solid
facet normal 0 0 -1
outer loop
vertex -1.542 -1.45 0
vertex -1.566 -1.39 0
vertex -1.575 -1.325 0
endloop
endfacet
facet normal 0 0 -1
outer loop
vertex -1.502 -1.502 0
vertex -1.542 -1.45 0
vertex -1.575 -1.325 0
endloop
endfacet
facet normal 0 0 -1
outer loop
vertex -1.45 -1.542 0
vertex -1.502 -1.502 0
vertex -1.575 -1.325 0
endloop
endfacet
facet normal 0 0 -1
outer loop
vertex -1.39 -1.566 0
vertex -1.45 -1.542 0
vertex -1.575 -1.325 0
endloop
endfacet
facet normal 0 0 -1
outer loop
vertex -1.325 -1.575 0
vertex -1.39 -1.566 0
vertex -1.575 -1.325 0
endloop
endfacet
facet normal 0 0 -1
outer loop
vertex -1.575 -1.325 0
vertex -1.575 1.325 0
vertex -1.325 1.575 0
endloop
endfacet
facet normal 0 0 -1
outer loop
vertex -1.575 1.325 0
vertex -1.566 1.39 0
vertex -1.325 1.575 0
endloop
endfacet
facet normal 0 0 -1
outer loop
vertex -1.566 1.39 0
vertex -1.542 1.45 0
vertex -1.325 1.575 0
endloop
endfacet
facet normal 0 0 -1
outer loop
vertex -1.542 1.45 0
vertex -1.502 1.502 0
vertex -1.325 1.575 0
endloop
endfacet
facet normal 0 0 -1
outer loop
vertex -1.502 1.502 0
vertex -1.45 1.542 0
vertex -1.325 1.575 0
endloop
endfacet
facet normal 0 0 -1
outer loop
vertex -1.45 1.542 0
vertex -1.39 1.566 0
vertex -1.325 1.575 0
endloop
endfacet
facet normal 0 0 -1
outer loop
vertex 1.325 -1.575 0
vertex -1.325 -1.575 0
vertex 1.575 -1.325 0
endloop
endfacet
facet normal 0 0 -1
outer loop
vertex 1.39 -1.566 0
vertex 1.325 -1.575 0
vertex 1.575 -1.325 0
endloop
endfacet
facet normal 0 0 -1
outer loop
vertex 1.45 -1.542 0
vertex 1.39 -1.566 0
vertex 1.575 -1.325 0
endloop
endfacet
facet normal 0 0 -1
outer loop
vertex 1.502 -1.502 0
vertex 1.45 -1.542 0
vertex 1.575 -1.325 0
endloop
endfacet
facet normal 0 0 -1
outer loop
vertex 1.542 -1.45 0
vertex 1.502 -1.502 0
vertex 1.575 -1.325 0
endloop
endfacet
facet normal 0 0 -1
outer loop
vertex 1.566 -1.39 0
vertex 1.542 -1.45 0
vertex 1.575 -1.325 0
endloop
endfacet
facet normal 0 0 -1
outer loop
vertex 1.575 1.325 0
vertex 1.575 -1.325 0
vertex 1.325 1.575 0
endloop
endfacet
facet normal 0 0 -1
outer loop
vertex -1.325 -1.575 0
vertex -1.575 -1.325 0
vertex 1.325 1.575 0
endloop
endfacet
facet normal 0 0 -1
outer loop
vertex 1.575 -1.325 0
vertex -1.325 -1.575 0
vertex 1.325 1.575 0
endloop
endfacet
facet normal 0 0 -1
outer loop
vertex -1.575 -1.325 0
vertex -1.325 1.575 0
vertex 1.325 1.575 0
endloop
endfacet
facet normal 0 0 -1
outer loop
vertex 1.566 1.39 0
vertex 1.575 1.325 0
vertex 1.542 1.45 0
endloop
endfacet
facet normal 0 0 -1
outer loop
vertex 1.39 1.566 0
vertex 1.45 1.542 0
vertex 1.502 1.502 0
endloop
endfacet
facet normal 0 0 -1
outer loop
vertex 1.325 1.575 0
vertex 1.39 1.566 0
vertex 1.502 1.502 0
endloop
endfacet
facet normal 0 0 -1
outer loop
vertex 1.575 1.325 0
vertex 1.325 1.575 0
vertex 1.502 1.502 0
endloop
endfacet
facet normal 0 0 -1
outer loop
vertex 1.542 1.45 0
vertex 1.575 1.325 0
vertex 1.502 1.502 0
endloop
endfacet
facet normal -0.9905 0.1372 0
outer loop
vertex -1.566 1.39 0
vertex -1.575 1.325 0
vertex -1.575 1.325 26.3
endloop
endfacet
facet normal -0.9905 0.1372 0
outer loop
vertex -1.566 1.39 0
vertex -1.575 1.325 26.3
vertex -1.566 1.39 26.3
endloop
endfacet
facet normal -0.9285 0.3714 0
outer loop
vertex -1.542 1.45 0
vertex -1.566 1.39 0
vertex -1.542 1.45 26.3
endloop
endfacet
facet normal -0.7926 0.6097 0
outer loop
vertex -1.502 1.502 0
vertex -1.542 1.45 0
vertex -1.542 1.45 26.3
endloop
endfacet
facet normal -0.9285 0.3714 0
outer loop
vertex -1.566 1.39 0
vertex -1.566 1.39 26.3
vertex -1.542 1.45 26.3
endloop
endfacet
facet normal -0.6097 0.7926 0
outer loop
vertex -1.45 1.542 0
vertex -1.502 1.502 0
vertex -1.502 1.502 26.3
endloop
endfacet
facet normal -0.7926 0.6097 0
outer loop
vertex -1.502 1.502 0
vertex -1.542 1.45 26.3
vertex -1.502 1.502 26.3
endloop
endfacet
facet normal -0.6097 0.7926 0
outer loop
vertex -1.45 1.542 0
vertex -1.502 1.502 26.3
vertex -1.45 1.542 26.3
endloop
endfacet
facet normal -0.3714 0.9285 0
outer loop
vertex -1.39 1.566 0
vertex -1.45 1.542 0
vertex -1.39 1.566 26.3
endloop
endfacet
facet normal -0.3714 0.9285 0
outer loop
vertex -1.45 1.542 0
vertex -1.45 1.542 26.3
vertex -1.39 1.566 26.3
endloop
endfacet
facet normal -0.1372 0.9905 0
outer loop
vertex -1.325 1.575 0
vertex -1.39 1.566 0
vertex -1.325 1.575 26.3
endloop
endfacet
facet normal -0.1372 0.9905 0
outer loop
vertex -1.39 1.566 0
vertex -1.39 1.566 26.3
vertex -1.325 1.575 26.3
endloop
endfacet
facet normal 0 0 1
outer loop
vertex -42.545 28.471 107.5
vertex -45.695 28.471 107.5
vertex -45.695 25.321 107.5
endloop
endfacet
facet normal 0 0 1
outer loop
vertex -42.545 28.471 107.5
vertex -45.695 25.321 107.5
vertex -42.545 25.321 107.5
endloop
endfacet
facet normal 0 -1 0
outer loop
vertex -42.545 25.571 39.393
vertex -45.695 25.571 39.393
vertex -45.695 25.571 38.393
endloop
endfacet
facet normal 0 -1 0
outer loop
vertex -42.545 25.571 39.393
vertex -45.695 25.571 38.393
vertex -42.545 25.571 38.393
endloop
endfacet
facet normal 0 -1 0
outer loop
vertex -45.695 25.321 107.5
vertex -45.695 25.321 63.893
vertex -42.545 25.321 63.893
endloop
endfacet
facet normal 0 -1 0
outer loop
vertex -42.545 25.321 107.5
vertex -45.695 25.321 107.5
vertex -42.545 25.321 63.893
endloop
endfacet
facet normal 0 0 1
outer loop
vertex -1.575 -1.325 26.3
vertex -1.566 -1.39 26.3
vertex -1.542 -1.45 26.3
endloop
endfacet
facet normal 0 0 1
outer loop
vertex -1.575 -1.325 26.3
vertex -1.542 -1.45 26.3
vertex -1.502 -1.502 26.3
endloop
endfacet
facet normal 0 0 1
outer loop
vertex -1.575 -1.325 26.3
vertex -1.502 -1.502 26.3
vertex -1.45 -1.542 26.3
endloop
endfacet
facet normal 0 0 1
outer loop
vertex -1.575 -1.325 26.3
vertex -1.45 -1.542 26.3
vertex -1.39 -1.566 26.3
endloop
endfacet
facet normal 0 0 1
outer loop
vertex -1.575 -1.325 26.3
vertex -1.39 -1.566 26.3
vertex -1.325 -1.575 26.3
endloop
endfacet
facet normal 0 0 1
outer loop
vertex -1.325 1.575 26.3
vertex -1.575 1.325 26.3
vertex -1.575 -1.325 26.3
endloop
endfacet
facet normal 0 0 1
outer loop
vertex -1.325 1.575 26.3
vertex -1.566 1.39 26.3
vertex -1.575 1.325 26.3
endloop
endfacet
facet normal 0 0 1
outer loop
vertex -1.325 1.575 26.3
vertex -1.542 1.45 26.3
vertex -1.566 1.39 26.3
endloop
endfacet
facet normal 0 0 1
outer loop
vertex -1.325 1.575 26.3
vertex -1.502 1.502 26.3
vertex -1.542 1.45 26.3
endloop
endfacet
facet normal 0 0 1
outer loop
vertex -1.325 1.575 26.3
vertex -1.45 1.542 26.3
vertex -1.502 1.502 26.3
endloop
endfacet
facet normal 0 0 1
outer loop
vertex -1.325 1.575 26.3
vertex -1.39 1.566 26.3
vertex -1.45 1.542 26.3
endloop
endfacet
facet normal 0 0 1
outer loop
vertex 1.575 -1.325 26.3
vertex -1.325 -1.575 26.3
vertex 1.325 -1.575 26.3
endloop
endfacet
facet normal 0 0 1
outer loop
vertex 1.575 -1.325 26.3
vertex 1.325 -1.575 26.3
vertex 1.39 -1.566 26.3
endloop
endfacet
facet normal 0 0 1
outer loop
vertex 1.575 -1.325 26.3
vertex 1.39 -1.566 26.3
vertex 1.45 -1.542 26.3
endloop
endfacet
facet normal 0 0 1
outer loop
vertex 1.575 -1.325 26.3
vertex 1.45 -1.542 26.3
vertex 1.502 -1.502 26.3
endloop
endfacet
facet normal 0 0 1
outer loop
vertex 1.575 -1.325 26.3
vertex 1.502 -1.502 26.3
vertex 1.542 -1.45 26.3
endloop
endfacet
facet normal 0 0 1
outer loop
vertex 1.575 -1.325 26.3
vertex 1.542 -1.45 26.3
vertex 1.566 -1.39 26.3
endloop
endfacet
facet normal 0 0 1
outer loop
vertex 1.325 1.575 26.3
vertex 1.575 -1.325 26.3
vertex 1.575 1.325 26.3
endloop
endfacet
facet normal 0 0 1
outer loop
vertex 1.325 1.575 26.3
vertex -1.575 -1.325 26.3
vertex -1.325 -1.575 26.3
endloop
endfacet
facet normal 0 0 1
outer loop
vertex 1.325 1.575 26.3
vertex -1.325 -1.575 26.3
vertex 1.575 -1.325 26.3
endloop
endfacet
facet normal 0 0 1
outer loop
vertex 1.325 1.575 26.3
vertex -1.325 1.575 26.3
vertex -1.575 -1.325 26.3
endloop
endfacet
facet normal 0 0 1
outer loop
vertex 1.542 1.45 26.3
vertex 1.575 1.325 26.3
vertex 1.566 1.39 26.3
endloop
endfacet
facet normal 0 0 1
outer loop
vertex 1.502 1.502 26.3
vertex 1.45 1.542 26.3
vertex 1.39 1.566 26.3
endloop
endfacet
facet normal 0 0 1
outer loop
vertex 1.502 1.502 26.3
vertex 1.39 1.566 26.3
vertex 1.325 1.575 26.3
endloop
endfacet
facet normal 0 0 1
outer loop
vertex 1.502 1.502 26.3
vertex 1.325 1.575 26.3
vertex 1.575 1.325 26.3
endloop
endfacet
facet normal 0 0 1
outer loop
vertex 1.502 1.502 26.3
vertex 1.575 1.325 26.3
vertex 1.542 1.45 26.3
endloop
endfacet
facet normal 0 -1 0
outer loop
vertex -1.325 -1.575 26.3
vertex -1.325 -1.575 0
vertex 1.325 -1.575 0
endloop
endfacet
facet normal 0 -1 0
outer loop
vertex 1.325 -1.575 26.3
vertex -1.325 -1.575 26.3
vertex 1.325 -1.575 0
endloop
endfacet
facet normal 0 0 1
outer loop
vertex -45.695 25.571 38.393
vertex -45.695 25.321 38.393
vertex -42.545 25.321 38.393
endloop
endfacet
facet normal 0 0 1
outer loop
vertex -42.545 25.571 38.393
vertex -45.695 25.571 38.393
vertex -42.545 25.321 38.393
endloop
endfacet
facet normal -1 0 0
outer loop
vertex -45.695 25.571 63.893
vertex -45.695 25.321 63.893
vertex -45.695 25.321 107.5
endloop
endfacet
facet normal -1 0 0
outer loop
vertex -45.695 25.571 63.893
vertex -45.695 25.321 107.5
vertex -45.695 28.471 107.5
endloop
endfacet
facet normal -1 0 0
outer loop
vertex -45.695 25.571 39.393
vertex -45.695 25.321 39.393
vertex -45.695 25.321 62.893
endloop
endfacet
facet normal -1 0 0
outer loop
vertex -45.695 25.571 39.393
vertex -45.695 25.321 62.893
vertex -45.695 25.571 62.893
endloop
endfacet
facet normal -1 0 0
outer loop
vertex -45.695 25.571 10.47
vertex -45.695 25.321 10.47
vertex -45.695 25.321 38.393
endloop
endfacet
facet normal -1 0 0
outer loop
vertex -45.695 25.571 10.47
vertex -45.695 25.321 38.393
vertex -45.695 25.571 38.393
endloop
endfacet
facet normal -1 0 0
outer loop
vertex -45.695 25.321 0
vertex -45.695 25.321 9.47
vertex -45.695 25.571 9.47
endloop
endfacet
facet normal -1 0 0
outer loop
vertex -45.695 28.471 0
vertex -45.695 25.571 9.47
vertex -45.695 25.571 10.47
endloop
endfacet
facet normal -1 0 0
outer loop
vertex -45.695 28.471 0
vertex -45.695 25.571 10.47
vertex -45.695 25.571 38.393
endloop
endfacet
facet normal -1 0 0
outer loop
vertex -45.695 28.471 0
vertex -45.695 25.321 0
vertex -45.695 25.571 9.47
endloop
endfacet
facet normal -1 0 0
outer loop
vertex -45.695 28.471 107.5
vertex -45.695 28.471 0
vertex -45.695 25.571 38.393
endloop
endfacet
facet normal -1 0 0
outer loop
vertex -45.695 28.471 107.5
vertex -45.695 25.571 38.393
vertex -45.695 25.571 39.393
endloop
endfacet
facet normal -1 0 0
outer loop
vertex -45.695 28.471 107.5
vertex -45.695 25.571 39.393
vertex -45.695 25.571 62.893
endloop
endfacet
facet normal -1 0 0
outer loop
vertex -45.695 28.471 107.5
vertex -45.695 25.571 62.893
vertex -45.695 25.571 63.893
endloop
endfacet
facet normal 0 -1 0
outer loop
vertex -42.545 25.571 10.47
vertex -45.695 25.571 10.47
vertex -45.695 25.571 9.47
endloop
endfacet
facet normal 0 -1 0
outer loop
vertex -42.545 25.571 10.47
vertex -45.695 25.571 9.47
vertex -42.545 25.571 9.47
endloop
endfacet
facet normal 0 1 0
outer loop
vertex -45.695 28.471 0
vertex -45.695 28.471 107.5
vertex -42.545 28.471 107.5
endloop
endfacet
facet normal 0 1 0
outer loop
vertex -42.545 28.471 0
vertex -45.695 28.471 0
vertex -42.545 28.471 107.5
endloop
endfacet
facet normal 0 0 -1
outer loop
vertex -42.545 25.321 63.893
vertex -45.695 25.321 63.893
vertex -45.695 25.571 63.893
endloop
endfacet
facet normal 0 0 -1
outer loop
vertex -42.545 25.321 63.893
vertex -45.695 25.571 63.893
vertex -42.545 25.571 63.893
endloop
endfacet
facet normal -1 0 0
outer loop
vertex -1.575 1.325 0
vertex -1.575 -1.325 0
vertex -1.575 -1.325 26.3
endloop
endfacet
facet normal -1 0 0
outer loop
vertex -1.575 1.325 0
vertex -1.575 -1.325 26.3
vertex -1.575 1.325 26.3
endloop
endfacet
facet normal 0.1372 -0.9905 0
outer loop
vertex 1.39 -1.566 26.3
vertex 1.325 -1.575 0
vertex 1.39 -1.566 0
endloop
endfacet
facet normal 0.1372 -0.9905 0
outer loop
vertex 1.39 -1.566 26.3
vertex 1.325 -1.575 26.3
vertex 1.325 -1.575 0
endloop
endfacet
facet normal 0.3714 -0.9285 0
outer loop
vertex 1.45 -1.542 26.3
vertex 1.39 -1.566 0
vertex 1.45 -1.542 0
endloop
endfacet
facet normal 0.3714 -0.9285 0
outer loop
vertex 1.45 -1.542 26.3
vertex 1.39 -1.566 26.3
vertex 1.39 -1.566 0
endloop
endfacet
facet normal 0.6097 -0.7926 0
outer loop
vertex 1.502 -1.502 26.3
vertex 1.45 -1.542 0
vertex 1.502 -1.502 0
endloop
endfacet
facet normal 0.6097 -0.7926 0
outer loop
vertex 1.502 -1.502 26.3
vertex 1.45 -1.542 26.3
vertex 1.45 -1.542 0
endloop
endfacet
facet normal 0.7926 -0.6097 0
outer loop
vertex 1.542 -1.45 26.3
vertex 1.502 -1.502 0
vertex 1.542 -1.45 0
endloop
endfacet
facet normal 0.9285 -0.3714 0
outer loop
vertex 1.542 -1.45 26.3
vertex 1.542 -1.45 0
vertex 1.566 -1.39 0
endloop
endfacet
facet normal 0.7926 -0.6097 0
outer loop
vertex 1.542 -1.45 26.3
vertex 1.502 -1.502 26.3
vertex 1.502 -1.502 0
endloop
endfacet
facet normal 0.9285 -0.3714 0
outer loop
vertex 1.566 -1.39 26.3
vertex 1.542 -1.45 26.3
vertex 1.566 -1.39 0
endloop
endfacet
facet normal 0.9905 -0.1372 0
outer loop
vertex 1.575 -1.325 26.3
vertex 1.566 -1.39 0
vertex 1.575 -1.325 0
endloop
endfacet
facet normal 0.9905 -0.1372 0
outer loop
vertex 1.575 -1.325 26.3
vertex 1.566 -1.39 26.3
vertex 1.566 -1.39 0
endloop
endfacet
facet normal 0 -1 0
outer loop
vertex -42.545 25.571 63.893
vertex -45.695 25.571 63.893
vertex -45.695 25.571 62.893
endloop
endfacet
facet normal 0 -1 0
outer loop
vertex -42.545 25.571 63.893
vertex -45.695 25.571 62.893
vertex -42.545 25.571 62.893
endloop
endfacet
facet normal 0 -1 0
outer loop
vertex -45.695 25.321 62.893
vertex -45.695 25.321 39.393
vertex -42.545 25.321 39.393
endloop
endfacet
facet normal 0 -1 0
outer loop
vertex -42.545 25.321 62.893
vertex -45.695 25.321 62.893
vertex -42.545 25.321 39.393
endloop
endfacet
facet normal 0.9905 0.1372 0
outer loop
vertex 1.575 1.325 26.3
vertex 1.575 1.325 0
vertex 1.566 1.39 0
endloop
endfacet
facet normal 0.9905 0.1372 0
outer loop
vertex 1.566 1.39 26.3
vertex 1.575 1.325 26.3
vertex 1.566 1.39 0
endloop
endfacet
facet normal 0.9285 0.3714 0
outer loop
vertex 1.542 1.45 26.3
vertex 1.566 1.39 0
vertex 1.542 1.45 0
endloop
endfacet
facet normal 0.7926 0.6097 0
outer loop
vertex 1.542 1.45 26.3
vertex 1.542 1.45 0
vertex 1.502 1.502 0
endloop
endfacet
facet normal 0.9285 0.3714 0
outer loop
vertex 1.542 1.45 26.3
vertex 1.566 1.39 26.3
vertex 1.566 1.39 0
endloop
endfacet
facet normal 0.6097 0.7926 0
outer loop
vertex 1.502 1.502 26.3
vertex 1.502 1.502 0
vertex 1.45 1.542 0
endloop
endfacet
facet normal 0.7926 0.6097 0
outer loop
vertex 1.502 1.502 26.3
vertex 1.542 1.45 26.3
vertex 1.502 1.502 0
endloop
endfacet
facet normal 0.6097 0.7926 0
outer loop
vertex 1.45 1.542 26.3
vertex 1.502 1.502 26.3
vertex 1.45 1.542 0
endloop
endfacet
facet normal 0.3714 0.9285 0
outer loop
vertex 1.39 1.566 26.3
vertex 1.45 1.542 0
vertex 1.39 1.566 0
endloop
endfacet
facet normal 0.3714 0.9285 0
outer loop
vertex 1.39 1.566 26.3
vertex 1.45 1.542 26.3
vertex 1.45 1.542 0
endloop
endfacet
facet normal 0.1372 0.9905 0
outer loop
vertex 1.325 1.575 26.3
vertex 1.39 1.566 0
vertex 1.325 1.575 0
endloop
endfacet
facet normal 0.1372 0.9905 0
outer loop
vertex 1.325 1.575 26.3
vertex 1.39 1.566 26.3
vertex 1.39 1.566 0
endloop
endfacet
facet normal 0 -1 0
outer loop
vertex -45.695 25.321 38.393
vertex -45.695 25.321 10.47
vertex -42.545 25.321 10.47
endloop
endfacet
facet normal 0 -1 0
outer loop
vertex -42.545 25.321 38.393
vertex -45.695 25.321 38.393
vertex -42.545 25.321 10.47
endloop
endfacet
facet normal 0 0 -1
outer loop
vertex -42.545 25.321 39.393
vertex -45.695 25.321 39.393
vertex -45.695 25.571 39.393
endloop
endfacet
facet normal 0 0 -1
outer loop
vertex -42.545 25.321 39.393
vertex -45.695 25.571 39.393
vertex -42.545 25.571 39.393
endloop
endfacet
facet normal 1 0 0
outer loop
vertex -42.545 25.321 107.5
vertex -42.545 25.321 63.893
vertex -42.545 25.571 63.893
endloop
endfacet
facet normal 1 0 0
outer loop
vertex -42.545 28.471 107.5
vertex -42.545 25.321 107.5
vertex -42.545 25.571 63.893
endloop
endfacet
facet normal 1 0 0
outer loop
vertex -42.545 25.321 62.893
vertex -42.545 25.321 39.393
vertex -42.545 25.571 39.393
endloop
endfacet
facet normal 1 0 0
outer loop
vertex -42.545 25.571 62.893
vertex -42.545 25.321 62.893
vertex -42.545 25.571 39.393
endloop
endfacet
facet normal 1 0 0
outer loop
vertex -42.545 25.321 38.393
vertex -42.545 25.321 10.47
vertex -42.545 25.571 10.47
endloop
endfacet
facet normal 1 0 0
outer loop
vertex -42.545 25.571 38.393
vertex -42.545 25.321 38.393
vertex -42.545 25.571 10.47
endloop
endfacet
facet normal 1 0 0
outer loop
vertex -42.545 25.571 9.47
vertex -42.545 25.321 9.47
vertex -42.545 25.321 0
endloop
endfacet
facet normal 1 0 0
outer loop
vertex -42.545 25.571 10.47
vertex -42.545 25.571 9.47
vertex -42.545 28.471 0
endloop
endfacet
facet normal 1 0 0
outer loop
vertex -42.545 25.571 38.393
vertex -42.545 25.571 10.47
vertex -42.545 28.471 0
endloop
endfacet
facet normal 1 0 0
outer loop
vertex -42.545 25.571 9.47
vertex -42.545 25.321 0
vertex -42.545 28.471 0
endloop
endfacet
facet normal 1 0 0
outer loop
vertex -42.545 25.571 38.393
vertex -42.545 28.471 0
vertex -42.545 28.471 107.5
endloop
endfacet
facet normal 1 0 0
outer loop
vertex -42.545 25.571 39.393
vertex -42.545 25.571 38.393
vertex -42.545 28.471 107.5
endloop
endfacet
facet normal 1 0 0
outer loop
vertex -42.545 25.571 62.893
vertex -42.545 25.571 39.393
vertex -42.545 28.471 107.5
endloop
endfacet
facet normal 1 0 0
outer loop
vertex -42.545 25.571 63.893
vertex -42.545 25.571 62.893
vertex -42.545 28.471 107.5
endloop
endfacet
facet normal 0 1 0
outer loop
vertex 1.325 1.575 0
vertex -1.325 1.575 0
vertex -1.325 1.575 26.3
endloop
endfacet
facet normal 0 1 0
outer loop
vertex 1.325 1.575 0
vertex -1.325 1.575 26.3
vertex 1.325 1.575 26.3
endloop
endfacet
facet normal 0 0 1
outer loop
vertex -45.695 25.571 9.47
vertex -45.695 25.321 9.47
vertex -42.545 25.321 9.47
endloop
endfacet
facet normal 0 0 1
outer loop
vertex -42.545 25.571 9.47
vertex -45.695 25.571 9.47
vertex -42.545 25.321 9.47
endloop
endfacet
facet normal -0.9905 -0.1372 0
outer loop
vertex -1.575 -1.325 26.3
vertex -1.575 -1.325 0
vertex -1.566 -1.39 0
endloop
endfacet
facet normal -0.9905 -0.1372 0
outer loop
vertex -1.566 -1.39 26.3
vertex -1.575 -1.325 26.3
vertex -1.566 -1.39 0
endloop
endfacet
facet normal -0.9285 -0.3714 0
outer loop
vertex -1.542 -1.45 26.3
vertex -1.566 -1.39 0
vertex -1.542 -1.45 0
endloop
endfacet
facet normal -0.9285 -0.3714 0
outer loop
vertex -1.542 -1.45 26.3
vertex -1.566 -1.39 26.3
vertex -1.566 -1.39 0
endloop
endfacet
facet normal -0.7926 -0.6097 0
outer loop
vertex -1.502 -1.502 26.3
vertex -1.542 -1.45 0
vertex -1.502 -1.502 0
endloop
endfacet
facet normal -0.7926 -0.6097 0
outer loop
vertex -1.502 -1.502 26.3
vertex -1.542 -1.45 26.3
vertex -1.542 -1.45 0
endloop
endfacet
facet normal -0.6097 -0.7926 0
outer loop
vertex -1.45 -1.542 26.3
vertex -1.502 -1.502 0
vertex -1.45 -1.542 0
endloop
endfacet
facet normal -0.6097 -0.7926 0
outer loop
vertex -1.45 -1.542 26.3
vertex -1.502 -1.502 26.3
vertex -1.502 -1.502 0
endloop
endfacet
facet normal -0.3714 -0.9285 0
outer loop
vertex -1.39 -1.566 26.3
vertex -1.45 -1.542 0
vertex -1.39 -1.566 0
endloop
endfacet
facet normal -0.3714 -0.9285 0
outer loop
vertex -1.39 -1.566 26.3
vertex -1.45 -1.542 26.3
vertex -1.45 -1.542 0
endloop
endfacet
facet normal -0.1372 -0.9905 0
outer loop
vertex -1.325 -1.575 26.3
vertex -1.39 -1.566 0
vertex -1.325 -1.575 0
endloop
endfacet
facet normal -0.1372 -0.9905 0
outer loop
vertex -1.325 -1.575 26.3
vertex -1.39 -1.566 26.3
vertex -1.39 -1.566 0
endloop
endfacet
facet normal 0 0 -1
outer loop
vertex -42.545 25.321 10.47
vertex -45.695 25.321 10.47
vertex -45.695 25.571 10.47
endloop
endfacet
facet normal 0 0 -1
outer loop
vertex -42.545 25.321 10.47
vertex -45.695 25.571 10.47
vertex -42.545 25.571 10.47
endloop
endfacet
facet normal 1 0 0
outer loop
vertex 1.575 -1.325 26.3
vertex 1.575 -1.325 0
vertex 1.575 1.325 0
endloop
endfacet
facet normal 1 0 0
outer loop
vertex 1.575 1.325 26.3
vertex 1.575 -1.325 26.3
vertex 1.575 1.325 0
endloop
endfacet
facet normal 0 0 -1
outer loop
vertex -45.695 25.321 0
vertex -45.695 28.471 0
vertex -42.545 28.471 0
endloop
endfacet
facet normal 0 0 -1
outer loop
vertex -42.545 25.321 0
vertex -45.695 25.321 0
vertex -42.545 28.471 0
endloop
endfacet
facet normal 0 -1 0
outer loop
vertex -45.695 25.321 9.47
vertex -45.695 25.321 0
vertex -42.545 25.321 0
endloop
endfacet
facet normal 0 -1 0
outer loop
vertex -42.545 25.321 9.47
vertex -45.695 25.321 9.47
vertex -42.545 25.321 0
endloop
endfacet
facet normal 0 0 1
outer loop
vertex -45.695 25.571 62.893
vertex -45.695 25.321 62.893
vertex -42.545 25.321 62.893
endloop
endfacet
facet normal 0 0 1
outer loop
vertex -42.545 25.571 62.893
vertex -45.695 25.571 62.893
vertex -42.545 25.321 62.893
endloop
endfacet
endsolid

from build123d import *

# Parameters (mm, degrees)
F0_W     = 3.15
F0_H     = 3.15
F1_DEPTH = 26.3
F2_R     = 0.25
F3_DEPTH = 107.5
F4_W     = 3.15
F4_H     = 1
F5_DEPTH = 0.25


with BuildPart() as f1:
    # F0 (on Top) → F1 (new body)
    with BuildSketch(Plane.XY):
        Rectangle(F0_W, F0_H)
    extrude(amount=F1_DEPTH)

    # F2
    f2_edges = [f1.edges().sort_by_distance(p)[0] for p in [
        (-1.575, -1.575, 13.15),
        (1.575, -1.575, 13.15),
        (1.575, 1.575, 13.15),
        (-1.575, 1.575, 13.15),
    ]]
    fillet(f2_edges, radius=F2_R)


with BuildPart() as f3:
    # F0 (on Top) → F3 (new body)
    with BuildSketch(Plane.XY):
        with Locations((-44.120011, 26.895686)):
            Rectangle(F0_W, F0_H)
    extrude(amount=F3_DEPTH)

    # F4 (on face) → F5 (cut)
    with BuildSketch(Plane.XZ.offset(-25.320686)):
        with Locations((-44.120011, 9.97)):
            Rectangle(F4_W, F4_H)
        with Locations((-44.120011, 38.893)):
            Rectangle(F4_W, F4_H)
        with Locations((-44.120011, 63.393)):
            Rectangle(F4_W, F4_H)
    extrude(amount=-F5_DEPTH, mode=Mode.SUBTRACT)


solid = Compound([f1.part, f3.part])
